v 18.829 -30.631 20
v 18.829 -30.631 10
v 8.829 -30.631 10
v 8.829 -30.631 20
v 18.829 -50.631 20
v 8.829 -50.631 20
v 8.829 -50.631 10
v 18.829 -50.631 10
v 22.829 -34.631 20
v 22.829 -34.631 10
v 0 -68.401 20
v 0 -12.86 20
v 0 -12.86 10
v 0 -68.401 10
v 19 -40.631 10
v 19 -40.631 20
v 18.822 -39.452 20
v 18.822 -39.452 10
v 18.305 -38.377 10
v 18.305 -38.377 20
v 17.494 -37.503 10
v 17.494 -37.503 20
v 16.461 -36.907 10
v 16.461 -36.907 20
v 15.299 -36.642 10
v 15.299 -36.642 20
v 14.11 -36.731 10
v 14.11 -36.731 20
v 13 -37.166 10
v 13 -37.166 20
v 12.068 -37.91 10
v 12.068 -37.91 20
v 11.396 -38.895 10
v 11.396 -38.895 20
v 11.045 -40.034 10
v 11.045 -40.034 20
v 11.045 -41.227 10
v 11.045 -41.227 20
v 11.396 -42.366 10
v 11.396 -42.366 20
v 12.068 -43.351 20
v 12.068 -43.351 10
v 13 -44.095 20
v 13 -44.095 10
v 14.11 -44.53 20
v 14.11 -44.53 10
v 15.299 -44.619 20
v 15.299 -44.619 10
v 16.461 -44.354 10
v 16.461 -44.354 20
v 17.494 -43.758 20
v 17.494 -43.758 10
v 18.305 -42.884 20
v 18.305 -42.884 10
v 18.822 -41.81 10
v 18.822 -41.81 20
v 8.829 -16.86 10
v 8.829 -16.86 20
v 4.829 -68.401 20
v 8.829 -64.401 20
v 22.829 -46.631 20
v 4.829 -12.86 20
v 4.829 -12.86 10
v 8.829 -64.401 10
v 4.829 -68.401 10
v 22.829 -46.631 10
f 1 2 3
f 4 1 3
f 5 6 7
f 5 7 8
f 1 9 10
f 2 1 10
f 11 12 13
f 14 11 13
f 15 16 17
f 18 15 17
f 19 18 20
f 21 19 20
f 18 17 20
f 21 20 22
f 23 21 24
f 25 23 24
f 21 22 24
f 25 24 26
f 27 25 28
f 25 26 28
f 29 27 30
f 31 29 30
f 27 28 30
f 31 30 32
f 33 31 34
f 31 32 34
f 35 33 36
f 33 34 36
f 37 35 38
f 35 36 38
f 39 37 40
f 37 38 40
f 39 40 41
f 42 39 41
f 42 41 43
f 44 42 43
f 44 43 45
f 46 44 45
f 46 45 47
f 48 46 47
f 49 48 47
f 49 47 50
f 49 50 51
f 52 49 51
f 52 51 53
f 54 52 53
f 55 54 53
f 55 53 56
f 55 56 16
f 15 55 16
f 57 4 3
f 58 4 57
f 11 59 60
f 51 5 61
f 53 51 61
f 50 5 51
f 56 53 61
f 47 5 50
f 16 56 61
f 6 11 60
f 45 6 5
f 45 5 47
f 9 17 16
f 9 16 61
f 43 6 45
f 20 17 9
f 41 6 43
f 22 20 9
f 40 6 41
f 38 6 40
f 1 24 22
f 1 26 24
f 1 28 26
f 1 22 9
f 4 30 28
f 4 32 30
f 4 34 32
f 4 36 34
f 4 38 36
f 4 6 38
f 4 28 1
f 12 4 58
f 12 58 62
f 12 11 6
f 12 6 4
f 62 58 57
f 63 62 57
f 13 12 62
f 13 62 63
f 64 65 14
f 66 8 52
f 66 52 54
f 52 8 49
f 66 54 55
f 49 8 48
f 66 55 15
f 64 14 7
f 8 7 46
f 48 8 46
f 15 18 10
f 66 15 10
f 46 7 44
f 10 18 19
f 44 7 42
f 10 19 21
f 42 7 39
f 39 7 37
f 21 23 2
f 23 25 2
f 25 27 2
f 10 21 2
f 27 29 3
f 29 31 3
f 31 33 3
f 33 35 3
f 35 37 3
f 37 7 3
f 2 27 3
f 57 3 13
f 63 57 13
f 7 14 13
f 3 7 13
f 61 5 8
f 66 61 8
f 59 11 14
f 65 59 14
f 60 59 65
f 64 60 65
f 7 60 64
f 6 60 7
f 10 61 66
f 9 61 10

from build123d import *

# Parameters (mm, degrees)
SKETCH_1_W          = 10
SKETCH_1_H          = 55.540767131
EXTRUDE_1_DEPTH     = 25
SKETCH_5_R          = 4.000000001
CUT_EXTRUDE_2_DEPTH = 74.509784895
CUT_EXTRUDE_3_DEPTH = 74.509784895
CHAMFER_1_SIZE      = 4


with BuildPart() as part:
    # Эскиз1 → Вытянуть1 (new body)
    with BuildSketch(Plane(origin=(0, 0, 0), x_dir=(0, 0, -1), z_dir=(1, 0, 0))):
        with Locations((-15, -40.630555576)):
            Rectangle(SKETCH_1_W, SKETCH_1_H)
    extrude(amount=EXTRUDE_1_DEPTH)

    # Эскиз5 → Вырез-Вытянуть2 (cut, through all)
    with BuildSketch(Plane.XY.offset(20)):
        with Locations((15, -40.630555576)):
            Circle(SKETCH_5_R)
    extrude(amount=-CUT_EXTRUDE_2_DEPTH, mode=Mode.SUBTRACT)

    # Эскиз6 → Вырез-Вытянуть3 (cut, through all)
    with BuildSketch(Plane.XY.offset(20)):
        Polygon((22.828613207, -50.630555576), (22.828613207, -30.630555576), (8.828613207, -30.630555576), (8.828613207, -12.86017201), (25, -12.86017201), (25, -68.400939141), (8.828613207, -68.400939141), (8.828613207, -50.630555576), align=None)
    extrude(amount=-CUT_EXTRUDE_3_DEPTH, mode=Mode.SUBTRACT)

    # Фаска1
    chamfer_1_edges = [part.edges().sort_by_distance(p)[0] for p in [
        (22.828613207, -30.630555576, 15),
        (8.828613207, -12.86017201, 15),
        (8.828613207, -68.400939141, 15),
        (22.828613207, -50.630555576, 15),
    ]]
    chamfer(chamfer_1_edges, length=CHAMFER_1_SIZE)


solid = part.part
